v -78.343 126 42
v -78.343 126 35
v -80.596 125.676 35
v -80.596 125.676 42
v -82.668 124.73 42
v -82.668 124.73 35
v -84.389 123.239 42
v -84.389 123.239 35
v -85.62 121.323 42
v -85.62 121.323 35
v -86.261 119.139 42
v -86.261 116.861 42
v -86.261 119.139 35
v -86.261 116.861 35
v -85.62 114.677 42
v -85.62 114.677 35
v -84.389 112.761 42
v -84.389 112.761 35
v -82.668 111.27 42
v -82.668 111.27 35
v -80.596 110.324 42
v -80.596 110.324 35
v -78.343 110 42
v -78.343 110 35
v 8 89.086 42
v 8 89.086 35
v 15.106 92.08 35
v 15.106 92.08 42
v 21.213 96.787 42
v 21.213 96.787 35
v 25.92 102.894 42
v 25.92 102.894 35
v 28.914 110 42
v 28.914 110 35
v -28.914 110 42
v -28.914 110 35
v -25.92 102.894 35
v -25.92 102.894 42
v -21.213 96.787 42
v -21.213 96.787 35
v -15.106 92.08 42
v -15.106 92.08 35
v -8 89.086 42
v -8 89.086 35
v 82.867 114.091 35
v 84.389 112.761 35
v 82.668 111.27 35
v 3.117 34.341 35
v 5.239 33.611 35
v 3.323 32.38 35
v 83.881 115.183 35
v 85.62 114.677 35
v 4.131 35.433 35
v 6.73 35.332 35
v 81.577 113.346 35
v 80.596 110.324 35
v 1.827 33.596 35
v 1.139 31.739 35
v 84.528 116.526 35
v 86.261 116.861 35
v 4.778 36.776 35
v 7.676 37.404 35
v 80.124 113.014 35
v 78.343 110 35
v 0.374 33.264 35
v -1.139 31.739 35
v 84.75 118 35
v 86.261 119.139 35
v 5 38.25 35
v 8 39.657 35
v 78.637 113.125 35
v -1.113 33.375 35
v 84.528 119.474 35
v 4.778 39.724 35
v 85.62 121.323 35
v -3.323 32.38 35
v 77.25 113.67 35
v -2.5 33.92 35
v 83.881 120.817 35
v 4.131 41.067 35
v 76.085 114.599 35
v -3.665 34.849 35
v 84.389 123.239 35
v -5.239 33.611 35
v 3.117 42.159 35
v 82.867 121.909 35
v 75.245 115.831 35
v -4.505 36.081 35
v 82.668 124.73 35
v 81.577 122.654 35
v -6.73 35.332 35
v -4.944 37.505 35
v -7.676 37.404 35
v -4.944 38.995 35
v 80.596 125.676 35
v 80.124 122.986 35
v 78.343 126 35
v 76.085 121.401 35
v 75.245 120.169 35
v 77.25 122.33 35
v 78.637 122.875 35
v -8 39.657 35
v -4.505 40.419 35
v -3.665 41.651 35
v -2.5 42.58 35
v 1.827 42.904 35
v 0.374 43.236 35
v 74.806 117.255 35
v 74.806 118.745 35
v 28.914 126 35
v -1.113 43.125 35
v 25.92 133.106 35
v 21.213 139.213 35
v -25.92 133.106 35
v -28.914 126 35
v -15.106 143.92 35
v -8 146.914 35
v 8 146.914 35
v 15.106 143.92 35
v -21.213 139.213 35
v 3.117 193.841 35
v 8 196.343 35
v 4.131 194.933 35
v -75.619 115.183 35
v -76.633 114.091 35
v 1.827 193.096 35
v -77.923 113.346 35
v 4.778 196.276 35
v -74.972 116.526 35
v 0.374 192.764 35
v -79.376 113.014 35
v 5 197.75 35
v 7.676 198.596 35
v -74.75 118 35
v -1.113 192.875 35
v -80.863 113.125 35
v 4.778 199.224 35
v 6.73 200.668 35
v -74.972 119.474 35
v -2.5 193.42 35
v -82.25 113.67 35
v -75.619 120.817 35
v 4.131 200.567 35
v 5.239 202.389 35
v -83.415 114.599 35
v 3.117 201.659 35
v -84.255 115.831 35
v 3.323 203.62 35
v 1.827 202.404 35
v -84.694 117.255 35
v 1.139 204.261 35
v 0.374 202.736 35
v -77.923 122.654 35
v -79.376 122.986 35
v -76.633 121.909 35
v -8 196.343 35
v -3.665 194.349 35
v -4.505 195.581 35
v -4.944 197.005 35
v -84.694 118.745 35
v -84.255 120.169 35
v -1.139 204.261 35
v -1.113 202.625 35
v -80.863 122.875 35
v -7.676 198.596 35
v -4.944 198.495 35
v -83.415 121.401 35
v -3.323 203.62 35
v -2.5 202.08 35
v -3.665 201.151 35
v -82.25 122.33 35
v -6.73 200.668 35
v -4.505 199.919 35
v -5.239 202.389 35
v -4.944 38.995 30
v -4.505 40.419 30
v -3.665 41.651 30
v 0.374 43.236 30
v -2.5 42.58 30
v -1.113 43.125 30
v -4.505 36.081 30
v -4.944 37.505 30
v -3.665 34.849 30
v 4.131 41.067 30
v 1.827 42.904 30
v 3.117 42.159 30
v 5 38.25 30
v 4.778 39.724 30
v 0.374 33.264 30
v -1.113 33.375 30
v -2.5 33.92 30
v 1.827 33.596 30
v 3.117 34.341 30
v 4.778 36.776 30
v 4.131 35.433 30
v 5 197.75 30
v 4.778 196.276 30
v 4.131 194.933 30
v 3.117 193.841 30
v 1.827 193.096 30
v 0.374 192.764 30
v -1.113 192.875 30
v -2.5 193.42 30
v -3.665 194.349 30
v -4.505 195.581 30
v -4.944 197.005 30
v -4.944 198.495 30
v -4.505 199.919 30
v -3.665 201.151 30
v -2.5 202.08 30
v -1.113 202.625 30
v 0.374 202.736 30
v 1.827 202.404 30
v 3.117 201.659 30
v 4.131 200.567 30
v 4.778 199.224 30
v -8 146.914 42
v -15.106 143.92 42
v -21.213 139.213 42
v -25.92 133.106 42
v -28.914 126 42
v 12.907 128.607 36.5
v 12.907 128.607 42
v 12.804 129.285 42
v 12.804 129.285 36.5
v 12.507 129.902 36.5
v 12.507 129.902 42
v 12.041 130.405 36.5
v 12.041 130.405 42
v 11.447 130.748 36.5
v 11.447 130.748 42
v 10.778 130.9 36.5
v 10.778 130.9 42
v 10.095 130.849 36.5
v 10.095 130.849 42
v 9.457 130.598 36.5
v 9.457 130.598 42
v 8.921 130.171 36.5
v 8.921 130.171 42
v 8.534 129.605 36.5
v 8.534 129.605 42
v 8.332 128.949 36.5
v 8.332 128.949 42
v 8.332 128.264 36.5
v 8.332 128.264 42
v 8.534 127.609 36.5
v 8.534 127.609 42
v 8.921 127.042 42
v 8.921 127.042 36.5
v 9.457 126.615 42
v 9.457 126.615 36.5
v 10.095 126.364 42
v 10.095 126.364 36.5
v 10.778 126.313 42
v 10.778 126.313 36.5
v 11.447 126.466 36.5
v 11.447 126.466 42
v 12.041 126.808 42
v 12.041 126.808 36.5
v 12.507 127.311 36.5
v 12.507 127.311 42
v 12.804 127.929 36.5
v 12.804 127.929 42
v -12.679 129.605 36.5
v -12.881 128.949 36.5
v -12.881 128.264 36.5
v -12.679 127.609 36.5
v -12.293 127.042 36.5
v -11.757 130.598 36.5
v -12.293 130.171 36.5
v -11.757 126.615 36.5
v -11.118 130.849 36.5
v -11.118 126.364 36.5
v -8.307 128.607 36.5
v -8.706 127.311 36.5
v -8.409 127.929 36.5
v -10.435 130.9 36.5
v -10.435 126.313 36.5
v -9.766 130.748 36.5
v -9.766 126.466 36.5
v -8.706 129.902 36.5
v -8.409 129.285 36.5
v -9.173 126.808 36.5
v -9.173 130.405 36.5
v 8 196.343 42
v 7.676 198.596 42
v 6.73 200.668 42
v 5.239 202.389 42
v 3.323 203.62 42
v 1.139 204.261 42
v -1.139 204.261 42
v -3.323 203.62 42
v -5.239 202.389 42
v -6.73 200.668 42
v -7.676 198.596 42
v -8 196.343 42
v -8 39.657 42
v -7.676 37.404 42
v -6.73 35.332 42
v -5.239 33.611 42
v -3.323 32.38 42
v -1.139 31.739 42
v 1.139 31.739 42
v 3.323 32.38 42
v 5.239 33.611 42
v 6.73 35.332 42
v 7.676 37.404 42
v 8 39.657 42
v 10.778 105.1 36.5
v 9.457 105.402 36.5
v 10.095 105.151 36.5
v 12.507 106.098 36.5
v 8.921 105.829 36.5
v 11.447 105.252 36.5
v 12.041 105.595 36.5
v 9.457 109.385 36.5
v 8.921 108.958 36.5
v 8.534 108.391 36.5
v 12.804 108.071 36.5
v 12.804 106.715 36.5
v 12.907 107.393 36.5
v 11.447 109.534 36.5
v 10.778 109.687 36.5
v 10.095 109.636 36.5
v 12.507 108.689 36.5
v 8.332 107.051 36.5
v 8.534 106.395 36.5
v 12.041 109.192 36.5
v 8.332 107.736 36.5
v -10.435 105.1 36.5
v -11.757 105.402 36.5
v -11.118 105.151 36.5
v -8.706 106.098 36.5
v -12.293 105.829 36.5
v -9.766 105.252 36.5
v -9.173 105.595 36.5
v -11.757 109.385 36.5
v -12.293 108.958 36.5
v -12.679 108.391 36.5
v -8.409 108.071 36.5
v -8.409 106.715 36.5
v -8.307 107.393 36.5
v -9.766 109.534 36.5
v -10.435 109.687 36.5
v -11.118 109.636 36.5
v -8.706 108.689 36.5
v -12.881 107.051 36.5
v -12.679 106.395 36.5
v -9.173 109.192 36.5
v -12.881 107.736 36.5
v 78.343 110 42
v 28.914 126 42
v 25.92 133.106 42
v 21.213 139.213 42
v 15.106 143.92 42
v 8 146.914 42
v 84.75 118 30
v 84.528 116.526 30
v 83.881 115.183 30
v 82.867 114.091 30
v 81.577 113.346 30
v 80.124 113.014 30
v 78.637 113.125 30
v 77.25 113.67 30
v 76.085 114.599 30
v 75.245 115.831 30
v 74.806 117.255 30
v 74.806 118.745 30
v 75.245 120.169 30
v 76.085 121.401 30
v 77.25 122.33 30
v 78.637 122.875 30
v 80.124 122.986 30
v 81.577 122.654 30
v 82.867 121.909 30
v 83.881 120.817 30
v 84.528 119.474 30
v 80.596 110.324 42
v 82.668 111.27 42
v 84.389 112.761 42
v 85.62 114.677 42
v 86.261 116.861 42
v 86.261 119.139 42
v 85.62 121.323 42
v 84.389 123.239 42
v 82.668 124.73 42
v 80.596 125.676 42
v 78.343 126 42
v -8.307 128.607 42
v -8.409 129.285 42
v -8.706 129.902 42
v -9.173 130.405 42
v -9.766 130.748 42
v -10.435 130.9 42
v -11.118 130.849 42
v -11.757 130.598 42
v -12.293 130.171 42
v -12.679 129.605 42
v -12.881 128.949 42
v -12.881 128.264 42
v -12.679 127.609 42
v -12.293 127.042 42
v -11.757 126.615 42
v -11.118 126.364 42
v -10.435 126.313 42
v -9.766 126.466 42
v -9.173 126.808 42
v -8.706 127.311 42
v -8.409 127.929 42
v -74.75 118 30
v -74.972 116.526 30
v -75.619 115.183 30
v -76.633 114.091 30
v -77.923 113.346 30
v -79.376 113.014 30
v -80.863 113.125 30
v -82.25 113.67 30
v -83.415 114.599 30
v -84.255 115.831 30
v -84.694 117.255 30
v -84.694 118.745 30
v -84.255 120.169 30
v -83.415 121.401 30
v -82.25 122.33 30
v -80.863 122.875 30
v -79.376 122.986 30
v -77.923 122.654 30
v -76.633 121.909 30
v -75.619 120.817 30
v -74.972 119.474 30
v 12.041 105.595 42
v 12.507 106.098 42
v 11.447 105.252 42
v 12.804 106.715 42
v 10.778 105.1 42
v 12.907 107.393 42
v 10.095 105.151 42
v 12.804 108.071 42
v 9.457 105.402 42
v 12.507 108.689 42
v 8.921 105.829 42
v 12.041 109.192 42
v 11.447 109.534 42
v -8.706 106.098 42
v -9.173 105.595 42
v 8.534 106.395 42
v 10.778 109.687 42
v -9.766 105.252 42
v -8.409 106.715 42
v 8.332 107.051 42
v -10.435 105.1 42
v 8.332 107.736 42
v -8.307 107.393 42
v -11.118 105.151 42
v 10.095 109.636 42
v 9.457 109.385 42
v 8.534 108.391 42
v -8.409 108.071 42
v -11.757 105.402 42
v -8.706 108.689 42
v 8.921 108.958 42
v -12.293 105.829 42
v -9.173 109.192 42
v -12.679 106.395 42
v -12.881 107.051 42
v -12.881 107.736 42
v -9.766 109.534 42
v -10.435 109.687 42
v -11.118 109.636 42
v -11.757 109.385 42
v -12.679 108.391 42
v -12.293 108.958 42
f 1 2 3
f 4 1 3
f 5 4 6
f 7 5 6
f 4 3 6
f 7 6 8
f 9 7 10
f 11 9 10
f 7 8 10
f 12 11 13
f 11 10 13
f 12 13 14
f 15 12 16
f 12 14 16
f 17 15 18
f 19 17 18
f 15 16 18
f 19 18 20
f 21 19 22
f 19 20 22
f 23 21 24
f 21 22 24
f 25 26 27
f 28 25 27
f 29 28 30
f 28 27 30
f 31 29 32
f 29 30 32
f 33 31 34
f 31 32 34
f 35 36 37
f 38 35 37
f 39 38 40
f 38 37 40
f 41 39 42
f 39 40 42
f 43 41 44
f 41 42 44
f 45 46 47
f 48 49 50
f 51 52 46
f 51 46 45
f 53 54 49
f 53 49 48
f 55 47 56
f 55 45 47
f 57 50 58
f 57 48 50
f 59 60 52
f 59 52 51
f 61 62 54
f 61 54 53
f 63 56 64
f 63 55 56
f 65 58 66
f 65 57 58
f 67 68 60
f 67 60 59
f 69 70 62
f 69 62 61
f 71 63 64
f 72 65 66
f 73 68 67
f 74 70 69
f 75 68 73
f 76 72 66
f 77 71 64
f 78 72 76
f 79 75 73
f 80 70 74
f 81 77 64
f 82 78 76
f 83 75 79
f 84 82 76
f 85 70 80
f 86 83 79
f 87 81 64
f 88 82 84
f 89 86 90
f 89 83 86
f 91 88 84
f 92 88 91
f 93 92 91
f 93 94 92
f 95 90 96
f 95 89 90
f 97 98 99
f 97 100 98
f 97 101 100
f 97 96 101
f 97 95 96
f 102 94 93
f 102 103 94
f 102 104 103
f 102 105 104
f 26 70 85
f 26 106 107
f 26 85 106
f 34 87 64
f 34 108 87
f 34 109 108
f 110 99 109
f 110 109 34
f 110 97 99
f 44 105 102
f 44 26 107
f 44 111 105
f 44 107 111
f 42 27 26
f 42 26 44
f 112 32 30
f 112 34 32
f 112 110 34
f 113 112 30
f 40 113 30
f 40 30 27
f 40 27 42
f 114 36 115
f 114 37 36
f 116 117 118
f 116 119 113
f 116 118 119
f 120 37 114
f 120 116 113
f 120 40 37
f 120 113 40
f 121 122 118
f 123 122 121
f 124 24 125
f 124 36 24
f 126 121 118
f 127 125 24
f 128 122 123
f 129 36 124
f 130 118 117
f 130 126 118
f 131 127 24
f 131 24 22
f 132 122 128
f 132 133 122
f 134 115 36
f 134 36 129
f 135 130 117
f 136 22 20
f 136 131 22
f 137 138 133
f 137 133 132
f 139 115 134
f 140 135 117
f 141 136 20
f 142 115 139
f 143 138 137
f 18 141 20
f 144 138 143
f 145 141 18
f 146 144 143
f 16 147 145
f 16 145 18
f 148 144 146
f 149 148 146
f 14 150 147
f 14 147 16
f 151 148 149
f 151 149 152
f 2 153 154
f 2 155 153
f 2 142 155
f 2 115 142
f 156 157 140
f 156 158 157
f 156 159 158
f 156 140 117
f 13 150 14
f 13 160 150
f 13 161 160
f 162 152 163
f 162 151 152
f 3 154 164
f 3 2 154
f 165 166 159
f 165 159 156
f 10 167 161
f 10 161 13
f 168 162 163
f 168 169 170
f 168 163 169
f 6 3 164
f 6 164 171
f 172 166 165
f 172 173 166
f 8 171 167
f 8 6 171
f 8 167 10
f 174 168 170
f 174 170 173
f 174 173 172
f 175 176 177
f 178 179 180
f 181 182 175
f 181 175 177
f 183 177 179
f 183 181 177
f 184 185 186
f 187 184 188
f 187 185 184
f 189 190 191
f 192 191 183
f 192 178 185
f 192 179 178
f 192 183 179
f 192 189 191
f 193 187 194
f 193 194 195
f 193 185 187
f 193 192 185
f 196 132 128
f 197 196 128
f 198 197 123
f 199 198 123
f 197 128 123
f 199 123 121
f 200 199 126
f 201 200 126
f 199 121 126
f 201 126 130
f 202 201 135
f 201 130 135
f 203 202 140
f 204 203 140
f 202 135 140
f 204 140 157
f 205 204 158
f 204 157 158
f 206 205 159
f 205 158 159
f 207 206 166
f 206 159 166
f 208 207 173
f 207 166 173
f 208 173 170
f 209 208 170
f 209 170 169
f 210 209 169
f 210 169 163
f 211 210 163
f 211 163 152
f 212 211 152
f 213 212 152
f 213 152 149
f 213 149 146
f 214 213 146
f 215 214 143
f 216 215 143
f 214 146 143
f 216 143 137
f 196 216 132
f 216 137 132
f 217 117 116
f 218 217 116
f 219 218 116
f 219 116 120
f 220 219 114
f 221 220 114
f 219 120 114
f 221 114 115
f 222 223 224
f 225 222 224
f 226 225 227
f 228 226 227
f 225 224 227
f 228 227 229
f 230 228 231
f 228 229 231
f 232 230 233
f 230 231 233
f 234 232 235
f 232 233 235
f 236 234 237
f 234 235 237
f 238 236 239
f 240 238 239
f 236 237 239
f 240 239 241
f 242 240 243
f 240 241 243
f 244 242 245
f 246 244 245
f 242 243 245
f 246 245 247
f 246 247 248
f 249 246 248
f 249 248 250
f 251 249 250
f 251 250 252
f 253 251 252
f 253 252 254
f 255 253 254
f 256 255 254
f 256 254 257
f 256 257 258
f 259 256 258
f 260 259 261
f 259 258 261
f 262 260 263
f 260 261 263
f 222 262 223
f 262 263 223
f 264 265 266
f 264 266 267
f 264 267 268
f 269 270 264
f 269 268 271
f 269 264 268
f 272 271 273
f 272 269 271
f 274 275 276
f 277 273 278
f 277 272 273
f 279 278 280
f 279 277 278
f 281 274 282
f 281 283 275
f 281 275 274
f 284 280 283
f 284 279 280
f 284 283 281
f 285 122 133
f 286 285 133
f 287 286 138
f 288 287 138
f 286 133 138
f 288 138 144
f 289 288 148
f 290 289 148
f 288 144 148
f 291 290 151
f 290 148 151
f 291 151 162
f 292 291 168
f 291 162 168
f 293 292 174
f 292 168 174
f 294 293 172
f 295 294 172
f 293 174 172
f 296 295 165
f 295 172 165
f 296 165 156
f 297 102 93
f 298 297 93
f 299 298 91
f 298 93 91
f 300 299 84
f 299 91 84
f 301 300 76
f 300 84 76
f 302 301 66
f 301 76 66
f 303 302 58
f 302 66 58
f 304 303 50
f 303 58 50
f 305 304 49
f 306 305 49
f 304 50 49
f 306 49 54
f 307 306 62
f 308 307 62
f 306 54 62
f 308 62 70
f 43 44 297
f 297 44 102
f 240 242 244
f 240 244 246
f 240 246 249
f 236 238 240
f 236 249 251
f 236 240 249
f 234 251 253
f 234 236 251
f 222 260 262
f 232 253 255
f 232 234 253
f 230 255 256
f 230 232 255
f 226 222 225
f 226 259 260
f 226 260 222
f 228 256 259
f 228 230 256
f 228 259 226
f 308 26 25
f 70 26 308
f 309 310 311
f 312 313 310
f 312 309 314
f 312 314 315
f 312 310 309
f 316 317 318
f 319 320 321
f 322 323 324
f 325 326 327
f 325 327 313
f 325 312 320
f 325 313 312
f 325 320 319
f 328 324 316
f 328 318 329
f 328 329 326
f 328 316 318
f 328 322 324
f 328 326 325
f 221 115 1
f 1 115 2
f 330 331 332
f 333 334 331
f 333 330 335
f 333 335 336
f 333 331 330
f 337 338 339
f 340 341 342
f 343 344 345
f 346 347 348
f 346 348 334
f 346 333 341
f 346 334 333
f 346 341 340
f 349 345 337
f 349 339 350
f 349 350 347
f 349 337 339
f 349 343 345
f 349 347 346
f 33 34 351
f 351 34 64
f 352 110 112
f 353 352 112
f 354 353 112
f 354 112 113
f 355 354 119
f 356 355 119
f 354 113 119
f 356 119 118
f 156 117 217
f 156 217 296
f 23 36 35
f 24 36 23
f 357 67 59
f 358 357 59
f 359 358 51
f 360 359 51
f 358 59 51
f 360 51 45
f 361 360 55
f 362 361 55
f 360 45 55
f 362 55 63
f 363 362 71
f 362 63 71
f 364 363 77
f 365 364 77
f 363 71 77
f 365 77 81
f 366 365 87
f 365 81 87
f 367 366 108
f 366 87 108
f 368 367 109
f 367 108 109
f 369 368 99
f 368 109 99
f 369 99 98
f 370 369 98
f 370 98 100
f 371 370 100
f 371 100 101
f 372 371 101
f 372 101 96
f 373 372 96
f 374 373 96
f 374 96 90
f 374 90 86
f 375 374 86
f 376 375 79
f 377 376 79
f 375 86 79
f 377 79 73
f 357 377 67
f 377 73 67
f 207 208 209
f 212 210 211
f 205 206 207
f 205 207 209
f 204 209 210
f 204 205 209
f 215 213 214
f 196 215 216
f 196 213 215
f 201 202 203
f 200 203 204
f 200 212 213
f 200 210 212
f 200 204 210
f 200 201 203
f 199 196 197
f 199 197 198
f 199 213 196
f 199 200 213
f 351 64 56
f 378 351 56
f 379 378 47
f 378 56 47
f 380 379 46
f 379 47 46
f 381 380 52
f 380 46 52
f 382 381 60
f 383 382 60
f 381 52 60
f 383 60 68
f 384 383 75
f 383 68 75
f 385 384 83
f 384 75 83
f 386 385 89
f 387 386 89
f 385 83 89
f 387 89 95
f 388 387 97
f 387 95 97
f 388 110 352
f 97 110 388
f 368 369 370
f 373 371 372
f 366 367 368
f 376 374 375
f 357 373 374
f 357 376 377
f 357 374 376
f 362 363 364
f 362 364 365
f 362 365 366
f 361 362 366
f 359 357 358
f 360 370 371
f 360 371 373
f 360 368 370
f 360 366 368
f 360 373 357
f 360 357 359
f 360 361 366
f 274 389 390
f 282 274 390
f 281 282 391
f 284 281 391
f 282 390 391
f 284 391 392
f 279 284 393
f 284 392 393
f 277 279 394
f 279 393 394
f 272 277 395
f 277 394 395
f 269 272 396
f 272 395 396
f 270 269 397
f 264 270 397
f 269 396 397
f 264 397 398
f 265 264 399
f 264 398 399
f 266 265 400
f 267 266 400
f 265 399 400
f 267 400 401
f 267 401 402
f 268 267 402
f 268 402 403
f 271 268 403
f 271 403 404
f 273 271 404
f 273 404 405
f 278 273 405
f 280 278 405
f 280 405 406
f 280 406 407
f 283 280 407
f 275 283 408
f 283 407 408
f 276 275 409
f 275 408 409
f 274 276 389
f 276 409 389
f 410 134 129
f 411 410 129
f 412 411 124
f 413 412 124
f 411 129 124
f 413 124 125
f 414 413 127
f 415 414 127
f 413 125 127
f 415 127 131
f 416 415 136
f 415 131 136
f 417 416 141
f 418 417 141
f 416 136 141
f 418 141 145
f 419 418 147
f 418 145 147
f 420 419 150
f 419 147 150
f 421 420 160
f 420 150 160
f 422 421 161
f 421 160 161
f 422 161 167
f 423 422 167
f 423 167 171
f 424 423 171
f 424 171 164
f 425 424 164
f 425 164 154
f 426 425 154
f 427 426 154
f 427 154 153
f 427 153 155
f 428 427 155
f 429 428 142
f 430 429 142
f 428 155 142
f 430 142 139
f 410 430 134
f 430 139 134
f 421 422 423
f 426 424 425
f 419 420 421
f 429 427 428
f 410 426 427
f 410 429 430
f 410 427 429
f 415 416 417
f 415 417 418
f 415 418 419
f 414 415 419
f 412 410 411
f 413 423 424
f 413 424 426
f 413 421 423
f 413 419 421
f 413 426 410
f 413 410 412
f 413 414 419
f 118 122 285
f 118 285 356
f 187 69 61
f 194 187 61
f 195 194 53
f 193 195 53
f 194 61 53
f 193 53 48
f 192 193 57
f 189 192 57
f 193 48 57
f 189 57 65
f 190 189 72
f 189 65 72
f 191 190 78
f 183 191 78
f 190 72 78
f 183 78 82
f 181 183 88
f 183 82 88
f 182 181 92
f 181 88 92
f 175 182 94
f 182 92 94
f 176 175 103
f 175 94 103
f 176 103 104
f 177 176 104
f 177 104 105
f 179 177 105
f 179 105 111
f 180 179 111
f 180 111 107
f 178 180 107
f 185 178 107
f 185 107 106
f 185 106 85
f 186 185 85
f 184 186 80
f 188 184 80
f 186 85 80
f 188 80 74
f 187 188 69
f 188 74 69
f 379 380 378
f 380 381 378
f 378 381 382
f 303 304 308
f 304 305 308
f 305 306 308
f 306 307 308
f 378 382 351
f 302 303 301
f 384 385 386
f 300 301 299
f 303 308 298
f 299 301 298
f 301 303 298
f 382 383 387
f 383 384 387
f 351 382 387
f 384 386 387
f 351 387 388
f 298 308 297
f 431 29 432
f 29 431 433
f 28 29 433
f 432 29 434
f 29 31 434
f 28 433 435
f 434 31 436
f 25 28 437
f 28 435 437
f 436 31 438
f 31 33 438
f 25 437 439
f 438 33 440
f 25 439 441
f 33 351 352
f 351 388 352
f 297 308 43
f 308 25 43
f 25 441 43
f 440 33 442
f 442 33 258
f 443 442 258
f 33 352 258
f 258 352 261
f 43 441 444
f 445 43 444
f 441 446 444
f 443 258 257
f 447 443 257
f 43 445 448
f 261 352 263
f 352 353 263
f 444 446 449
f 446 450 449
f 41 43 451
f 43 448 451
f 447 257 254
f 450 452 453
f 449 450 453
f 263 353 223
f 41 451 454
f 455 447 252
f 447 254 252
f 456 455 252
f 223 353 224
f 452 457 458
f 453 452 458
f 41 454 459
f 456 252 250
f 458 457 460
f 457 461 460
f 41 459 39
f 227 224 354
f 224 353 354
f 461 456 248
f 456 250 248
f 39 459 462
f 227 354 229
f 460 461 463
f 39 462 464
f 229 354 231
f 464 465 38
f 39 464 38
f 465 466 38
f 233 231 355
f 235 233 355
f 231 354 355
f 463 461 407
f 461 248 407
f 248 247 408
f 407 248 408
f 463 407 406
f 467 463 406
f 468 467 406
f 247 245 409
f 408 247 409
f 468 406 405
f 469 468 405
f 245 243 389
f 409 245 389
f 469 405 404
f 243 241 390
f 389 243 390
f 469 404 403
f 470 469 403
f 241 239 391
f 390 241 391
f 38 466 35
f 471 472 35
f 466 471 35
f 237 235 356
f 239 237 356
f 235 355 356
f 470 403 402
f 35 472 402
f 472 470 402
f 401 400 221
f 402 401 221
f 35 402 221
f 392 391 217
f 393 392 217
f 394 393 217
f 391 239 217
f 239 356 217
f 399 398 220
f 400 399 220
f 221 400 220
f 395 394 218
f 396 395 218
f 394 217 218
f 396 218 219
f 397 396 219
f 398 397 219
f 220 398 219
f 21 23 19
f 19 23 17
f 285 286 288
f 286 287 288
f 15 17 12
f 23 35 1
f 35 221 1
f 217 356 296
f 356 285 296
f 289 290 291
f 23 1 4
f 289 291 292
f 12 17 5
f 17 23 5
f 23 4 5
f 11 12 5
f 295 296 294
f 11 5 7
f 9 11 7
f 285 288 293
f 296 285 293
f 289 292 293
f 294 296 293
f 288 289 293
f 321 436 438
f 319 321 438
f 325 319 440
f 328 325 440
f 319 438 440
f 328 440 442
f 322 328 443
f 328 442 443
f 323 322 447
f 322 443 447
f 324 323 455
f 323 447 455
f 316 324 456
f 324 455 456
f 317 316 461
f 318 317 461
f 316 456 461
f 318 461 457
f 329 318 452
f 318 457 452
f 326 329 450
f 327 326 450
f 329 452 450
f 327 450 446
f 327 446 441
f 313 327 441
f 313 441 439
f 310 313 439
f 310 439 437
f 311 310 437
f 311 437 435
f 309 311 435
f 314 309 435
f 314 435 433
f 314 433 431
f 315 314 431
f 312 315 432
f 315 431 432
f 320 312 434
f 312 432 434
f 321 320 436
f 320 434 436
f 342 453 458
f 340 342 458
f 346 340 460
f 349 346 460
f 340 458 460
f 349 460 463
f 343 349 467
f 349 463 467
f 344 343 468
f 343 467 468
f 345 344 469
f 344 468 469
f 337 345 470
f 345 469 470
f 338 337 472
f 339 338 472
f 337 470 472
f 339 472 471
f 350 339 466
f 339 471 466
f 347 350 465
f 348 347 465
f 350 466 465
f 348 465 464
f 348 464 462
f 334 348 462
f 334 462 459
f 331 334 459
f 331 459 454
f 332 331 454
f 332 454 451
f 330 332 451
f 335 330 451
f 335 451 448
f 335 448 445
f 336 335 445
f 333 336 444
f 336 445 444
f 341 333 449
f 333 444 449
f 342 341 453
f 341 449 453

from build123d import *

# Parameters (mm, degrees)
PAD048_DEPTH    = 7
SKETCH145_R     = 5
PAD052_DEPTH    = 5
SKETCH146_R     = 2.3
POCKET042_DEPTH = 5.5


with BuildPart() as part:
    # Sketch134 → Pad048 (new body)
    with BuildSketch(Plane.XY):
        with BuildLine():
            Line((28.913665, 126), (78.342597, 126))
            ThreePointArc((78.342597, 110), (86.342597, 118), (78.342597, 126))
            Line((28.913665, 110), (78.342597, 110))
            ThreePointArc((8, 89.086335), (21.213203, 96.786797), (28.913665, 110))
            Line((8, 89.086335), (8, 39.657403))
            ThreePointArc((-8, 39.657403), (0, 31.657429), (8, 39.657403))
            Line((-8, 89.086335), (-8, 39.657403))
            ThreePointArc((-28.913665, 110), (-21.213203, 96.786797), (-8, 89.086335))
            Line((-28.913665, 110), (-78.342597, 110))
            ThreePointArc((-78.342597, 126), (-86.342605, 118), (-78.342597, 110))
            Line((-28.913665, 126), (-78.342597, 126))
            ThreePointArc((-8, 146.913665), (-21.213203, 139.213203), (-28.913665, 126))
            Line((-8, 146.913665), (-8, 196.342597))
            ThreePointArc((8, 196.342597), (0, 204.342636), (-8, 196.342597))
            Line((8, 196.342597), (8, 146.913665))
            ThreePointArc((28.913665, 126), (21.213203, 139.213203), (8, 146.913665))
        make_face()
    extrude(amount=PAD048_DEPTH)

    # Sketch145 → Pad052 (join)
    with BuildSketch(Plane(origin=(0, 0, 0), x_dir=(1, 0, 0), z_dir=(0, 0, -1))):
        with Locations((0, -38.25)):
            Circle(SKETCH145_R)
        with Locations((0, -197.75)):
            Circle(SKETCH145_R)
        with Locations((-79.75, -118)):
            Circle(SKETCH145_R)
        with Locations((79.75, -118)):
            Circle(SKETCH145_R)
    extrude(amount=PAD052_DEPTH)

    # Sketch146 (on Face5 of Pad052) → Pocket042 (cut)
    with BuildSketch(Plane.XY.offset(7)):
        with Locations((-10.606602, 128.606602)):
            Circle(SKETCH146_R)
        with Locations((10.606602, 128.606602)):
            Circle(SKETCH146_R)
        with Locations((10.606602, 107.393398)):
            Circle(SKETCH146_R)
        with Locations((-10.606602, 107.393398)):
            Circle(SKETCH146_R)
    extrude(amount=-POCKET042_DEPTH, mode=Mode.SUBTRACT)


with BuildPart() as part_1:
    # Body021 placement: moved
    add(part.part.moved(Location((0, 0, 35))))


solid = part_1.part
